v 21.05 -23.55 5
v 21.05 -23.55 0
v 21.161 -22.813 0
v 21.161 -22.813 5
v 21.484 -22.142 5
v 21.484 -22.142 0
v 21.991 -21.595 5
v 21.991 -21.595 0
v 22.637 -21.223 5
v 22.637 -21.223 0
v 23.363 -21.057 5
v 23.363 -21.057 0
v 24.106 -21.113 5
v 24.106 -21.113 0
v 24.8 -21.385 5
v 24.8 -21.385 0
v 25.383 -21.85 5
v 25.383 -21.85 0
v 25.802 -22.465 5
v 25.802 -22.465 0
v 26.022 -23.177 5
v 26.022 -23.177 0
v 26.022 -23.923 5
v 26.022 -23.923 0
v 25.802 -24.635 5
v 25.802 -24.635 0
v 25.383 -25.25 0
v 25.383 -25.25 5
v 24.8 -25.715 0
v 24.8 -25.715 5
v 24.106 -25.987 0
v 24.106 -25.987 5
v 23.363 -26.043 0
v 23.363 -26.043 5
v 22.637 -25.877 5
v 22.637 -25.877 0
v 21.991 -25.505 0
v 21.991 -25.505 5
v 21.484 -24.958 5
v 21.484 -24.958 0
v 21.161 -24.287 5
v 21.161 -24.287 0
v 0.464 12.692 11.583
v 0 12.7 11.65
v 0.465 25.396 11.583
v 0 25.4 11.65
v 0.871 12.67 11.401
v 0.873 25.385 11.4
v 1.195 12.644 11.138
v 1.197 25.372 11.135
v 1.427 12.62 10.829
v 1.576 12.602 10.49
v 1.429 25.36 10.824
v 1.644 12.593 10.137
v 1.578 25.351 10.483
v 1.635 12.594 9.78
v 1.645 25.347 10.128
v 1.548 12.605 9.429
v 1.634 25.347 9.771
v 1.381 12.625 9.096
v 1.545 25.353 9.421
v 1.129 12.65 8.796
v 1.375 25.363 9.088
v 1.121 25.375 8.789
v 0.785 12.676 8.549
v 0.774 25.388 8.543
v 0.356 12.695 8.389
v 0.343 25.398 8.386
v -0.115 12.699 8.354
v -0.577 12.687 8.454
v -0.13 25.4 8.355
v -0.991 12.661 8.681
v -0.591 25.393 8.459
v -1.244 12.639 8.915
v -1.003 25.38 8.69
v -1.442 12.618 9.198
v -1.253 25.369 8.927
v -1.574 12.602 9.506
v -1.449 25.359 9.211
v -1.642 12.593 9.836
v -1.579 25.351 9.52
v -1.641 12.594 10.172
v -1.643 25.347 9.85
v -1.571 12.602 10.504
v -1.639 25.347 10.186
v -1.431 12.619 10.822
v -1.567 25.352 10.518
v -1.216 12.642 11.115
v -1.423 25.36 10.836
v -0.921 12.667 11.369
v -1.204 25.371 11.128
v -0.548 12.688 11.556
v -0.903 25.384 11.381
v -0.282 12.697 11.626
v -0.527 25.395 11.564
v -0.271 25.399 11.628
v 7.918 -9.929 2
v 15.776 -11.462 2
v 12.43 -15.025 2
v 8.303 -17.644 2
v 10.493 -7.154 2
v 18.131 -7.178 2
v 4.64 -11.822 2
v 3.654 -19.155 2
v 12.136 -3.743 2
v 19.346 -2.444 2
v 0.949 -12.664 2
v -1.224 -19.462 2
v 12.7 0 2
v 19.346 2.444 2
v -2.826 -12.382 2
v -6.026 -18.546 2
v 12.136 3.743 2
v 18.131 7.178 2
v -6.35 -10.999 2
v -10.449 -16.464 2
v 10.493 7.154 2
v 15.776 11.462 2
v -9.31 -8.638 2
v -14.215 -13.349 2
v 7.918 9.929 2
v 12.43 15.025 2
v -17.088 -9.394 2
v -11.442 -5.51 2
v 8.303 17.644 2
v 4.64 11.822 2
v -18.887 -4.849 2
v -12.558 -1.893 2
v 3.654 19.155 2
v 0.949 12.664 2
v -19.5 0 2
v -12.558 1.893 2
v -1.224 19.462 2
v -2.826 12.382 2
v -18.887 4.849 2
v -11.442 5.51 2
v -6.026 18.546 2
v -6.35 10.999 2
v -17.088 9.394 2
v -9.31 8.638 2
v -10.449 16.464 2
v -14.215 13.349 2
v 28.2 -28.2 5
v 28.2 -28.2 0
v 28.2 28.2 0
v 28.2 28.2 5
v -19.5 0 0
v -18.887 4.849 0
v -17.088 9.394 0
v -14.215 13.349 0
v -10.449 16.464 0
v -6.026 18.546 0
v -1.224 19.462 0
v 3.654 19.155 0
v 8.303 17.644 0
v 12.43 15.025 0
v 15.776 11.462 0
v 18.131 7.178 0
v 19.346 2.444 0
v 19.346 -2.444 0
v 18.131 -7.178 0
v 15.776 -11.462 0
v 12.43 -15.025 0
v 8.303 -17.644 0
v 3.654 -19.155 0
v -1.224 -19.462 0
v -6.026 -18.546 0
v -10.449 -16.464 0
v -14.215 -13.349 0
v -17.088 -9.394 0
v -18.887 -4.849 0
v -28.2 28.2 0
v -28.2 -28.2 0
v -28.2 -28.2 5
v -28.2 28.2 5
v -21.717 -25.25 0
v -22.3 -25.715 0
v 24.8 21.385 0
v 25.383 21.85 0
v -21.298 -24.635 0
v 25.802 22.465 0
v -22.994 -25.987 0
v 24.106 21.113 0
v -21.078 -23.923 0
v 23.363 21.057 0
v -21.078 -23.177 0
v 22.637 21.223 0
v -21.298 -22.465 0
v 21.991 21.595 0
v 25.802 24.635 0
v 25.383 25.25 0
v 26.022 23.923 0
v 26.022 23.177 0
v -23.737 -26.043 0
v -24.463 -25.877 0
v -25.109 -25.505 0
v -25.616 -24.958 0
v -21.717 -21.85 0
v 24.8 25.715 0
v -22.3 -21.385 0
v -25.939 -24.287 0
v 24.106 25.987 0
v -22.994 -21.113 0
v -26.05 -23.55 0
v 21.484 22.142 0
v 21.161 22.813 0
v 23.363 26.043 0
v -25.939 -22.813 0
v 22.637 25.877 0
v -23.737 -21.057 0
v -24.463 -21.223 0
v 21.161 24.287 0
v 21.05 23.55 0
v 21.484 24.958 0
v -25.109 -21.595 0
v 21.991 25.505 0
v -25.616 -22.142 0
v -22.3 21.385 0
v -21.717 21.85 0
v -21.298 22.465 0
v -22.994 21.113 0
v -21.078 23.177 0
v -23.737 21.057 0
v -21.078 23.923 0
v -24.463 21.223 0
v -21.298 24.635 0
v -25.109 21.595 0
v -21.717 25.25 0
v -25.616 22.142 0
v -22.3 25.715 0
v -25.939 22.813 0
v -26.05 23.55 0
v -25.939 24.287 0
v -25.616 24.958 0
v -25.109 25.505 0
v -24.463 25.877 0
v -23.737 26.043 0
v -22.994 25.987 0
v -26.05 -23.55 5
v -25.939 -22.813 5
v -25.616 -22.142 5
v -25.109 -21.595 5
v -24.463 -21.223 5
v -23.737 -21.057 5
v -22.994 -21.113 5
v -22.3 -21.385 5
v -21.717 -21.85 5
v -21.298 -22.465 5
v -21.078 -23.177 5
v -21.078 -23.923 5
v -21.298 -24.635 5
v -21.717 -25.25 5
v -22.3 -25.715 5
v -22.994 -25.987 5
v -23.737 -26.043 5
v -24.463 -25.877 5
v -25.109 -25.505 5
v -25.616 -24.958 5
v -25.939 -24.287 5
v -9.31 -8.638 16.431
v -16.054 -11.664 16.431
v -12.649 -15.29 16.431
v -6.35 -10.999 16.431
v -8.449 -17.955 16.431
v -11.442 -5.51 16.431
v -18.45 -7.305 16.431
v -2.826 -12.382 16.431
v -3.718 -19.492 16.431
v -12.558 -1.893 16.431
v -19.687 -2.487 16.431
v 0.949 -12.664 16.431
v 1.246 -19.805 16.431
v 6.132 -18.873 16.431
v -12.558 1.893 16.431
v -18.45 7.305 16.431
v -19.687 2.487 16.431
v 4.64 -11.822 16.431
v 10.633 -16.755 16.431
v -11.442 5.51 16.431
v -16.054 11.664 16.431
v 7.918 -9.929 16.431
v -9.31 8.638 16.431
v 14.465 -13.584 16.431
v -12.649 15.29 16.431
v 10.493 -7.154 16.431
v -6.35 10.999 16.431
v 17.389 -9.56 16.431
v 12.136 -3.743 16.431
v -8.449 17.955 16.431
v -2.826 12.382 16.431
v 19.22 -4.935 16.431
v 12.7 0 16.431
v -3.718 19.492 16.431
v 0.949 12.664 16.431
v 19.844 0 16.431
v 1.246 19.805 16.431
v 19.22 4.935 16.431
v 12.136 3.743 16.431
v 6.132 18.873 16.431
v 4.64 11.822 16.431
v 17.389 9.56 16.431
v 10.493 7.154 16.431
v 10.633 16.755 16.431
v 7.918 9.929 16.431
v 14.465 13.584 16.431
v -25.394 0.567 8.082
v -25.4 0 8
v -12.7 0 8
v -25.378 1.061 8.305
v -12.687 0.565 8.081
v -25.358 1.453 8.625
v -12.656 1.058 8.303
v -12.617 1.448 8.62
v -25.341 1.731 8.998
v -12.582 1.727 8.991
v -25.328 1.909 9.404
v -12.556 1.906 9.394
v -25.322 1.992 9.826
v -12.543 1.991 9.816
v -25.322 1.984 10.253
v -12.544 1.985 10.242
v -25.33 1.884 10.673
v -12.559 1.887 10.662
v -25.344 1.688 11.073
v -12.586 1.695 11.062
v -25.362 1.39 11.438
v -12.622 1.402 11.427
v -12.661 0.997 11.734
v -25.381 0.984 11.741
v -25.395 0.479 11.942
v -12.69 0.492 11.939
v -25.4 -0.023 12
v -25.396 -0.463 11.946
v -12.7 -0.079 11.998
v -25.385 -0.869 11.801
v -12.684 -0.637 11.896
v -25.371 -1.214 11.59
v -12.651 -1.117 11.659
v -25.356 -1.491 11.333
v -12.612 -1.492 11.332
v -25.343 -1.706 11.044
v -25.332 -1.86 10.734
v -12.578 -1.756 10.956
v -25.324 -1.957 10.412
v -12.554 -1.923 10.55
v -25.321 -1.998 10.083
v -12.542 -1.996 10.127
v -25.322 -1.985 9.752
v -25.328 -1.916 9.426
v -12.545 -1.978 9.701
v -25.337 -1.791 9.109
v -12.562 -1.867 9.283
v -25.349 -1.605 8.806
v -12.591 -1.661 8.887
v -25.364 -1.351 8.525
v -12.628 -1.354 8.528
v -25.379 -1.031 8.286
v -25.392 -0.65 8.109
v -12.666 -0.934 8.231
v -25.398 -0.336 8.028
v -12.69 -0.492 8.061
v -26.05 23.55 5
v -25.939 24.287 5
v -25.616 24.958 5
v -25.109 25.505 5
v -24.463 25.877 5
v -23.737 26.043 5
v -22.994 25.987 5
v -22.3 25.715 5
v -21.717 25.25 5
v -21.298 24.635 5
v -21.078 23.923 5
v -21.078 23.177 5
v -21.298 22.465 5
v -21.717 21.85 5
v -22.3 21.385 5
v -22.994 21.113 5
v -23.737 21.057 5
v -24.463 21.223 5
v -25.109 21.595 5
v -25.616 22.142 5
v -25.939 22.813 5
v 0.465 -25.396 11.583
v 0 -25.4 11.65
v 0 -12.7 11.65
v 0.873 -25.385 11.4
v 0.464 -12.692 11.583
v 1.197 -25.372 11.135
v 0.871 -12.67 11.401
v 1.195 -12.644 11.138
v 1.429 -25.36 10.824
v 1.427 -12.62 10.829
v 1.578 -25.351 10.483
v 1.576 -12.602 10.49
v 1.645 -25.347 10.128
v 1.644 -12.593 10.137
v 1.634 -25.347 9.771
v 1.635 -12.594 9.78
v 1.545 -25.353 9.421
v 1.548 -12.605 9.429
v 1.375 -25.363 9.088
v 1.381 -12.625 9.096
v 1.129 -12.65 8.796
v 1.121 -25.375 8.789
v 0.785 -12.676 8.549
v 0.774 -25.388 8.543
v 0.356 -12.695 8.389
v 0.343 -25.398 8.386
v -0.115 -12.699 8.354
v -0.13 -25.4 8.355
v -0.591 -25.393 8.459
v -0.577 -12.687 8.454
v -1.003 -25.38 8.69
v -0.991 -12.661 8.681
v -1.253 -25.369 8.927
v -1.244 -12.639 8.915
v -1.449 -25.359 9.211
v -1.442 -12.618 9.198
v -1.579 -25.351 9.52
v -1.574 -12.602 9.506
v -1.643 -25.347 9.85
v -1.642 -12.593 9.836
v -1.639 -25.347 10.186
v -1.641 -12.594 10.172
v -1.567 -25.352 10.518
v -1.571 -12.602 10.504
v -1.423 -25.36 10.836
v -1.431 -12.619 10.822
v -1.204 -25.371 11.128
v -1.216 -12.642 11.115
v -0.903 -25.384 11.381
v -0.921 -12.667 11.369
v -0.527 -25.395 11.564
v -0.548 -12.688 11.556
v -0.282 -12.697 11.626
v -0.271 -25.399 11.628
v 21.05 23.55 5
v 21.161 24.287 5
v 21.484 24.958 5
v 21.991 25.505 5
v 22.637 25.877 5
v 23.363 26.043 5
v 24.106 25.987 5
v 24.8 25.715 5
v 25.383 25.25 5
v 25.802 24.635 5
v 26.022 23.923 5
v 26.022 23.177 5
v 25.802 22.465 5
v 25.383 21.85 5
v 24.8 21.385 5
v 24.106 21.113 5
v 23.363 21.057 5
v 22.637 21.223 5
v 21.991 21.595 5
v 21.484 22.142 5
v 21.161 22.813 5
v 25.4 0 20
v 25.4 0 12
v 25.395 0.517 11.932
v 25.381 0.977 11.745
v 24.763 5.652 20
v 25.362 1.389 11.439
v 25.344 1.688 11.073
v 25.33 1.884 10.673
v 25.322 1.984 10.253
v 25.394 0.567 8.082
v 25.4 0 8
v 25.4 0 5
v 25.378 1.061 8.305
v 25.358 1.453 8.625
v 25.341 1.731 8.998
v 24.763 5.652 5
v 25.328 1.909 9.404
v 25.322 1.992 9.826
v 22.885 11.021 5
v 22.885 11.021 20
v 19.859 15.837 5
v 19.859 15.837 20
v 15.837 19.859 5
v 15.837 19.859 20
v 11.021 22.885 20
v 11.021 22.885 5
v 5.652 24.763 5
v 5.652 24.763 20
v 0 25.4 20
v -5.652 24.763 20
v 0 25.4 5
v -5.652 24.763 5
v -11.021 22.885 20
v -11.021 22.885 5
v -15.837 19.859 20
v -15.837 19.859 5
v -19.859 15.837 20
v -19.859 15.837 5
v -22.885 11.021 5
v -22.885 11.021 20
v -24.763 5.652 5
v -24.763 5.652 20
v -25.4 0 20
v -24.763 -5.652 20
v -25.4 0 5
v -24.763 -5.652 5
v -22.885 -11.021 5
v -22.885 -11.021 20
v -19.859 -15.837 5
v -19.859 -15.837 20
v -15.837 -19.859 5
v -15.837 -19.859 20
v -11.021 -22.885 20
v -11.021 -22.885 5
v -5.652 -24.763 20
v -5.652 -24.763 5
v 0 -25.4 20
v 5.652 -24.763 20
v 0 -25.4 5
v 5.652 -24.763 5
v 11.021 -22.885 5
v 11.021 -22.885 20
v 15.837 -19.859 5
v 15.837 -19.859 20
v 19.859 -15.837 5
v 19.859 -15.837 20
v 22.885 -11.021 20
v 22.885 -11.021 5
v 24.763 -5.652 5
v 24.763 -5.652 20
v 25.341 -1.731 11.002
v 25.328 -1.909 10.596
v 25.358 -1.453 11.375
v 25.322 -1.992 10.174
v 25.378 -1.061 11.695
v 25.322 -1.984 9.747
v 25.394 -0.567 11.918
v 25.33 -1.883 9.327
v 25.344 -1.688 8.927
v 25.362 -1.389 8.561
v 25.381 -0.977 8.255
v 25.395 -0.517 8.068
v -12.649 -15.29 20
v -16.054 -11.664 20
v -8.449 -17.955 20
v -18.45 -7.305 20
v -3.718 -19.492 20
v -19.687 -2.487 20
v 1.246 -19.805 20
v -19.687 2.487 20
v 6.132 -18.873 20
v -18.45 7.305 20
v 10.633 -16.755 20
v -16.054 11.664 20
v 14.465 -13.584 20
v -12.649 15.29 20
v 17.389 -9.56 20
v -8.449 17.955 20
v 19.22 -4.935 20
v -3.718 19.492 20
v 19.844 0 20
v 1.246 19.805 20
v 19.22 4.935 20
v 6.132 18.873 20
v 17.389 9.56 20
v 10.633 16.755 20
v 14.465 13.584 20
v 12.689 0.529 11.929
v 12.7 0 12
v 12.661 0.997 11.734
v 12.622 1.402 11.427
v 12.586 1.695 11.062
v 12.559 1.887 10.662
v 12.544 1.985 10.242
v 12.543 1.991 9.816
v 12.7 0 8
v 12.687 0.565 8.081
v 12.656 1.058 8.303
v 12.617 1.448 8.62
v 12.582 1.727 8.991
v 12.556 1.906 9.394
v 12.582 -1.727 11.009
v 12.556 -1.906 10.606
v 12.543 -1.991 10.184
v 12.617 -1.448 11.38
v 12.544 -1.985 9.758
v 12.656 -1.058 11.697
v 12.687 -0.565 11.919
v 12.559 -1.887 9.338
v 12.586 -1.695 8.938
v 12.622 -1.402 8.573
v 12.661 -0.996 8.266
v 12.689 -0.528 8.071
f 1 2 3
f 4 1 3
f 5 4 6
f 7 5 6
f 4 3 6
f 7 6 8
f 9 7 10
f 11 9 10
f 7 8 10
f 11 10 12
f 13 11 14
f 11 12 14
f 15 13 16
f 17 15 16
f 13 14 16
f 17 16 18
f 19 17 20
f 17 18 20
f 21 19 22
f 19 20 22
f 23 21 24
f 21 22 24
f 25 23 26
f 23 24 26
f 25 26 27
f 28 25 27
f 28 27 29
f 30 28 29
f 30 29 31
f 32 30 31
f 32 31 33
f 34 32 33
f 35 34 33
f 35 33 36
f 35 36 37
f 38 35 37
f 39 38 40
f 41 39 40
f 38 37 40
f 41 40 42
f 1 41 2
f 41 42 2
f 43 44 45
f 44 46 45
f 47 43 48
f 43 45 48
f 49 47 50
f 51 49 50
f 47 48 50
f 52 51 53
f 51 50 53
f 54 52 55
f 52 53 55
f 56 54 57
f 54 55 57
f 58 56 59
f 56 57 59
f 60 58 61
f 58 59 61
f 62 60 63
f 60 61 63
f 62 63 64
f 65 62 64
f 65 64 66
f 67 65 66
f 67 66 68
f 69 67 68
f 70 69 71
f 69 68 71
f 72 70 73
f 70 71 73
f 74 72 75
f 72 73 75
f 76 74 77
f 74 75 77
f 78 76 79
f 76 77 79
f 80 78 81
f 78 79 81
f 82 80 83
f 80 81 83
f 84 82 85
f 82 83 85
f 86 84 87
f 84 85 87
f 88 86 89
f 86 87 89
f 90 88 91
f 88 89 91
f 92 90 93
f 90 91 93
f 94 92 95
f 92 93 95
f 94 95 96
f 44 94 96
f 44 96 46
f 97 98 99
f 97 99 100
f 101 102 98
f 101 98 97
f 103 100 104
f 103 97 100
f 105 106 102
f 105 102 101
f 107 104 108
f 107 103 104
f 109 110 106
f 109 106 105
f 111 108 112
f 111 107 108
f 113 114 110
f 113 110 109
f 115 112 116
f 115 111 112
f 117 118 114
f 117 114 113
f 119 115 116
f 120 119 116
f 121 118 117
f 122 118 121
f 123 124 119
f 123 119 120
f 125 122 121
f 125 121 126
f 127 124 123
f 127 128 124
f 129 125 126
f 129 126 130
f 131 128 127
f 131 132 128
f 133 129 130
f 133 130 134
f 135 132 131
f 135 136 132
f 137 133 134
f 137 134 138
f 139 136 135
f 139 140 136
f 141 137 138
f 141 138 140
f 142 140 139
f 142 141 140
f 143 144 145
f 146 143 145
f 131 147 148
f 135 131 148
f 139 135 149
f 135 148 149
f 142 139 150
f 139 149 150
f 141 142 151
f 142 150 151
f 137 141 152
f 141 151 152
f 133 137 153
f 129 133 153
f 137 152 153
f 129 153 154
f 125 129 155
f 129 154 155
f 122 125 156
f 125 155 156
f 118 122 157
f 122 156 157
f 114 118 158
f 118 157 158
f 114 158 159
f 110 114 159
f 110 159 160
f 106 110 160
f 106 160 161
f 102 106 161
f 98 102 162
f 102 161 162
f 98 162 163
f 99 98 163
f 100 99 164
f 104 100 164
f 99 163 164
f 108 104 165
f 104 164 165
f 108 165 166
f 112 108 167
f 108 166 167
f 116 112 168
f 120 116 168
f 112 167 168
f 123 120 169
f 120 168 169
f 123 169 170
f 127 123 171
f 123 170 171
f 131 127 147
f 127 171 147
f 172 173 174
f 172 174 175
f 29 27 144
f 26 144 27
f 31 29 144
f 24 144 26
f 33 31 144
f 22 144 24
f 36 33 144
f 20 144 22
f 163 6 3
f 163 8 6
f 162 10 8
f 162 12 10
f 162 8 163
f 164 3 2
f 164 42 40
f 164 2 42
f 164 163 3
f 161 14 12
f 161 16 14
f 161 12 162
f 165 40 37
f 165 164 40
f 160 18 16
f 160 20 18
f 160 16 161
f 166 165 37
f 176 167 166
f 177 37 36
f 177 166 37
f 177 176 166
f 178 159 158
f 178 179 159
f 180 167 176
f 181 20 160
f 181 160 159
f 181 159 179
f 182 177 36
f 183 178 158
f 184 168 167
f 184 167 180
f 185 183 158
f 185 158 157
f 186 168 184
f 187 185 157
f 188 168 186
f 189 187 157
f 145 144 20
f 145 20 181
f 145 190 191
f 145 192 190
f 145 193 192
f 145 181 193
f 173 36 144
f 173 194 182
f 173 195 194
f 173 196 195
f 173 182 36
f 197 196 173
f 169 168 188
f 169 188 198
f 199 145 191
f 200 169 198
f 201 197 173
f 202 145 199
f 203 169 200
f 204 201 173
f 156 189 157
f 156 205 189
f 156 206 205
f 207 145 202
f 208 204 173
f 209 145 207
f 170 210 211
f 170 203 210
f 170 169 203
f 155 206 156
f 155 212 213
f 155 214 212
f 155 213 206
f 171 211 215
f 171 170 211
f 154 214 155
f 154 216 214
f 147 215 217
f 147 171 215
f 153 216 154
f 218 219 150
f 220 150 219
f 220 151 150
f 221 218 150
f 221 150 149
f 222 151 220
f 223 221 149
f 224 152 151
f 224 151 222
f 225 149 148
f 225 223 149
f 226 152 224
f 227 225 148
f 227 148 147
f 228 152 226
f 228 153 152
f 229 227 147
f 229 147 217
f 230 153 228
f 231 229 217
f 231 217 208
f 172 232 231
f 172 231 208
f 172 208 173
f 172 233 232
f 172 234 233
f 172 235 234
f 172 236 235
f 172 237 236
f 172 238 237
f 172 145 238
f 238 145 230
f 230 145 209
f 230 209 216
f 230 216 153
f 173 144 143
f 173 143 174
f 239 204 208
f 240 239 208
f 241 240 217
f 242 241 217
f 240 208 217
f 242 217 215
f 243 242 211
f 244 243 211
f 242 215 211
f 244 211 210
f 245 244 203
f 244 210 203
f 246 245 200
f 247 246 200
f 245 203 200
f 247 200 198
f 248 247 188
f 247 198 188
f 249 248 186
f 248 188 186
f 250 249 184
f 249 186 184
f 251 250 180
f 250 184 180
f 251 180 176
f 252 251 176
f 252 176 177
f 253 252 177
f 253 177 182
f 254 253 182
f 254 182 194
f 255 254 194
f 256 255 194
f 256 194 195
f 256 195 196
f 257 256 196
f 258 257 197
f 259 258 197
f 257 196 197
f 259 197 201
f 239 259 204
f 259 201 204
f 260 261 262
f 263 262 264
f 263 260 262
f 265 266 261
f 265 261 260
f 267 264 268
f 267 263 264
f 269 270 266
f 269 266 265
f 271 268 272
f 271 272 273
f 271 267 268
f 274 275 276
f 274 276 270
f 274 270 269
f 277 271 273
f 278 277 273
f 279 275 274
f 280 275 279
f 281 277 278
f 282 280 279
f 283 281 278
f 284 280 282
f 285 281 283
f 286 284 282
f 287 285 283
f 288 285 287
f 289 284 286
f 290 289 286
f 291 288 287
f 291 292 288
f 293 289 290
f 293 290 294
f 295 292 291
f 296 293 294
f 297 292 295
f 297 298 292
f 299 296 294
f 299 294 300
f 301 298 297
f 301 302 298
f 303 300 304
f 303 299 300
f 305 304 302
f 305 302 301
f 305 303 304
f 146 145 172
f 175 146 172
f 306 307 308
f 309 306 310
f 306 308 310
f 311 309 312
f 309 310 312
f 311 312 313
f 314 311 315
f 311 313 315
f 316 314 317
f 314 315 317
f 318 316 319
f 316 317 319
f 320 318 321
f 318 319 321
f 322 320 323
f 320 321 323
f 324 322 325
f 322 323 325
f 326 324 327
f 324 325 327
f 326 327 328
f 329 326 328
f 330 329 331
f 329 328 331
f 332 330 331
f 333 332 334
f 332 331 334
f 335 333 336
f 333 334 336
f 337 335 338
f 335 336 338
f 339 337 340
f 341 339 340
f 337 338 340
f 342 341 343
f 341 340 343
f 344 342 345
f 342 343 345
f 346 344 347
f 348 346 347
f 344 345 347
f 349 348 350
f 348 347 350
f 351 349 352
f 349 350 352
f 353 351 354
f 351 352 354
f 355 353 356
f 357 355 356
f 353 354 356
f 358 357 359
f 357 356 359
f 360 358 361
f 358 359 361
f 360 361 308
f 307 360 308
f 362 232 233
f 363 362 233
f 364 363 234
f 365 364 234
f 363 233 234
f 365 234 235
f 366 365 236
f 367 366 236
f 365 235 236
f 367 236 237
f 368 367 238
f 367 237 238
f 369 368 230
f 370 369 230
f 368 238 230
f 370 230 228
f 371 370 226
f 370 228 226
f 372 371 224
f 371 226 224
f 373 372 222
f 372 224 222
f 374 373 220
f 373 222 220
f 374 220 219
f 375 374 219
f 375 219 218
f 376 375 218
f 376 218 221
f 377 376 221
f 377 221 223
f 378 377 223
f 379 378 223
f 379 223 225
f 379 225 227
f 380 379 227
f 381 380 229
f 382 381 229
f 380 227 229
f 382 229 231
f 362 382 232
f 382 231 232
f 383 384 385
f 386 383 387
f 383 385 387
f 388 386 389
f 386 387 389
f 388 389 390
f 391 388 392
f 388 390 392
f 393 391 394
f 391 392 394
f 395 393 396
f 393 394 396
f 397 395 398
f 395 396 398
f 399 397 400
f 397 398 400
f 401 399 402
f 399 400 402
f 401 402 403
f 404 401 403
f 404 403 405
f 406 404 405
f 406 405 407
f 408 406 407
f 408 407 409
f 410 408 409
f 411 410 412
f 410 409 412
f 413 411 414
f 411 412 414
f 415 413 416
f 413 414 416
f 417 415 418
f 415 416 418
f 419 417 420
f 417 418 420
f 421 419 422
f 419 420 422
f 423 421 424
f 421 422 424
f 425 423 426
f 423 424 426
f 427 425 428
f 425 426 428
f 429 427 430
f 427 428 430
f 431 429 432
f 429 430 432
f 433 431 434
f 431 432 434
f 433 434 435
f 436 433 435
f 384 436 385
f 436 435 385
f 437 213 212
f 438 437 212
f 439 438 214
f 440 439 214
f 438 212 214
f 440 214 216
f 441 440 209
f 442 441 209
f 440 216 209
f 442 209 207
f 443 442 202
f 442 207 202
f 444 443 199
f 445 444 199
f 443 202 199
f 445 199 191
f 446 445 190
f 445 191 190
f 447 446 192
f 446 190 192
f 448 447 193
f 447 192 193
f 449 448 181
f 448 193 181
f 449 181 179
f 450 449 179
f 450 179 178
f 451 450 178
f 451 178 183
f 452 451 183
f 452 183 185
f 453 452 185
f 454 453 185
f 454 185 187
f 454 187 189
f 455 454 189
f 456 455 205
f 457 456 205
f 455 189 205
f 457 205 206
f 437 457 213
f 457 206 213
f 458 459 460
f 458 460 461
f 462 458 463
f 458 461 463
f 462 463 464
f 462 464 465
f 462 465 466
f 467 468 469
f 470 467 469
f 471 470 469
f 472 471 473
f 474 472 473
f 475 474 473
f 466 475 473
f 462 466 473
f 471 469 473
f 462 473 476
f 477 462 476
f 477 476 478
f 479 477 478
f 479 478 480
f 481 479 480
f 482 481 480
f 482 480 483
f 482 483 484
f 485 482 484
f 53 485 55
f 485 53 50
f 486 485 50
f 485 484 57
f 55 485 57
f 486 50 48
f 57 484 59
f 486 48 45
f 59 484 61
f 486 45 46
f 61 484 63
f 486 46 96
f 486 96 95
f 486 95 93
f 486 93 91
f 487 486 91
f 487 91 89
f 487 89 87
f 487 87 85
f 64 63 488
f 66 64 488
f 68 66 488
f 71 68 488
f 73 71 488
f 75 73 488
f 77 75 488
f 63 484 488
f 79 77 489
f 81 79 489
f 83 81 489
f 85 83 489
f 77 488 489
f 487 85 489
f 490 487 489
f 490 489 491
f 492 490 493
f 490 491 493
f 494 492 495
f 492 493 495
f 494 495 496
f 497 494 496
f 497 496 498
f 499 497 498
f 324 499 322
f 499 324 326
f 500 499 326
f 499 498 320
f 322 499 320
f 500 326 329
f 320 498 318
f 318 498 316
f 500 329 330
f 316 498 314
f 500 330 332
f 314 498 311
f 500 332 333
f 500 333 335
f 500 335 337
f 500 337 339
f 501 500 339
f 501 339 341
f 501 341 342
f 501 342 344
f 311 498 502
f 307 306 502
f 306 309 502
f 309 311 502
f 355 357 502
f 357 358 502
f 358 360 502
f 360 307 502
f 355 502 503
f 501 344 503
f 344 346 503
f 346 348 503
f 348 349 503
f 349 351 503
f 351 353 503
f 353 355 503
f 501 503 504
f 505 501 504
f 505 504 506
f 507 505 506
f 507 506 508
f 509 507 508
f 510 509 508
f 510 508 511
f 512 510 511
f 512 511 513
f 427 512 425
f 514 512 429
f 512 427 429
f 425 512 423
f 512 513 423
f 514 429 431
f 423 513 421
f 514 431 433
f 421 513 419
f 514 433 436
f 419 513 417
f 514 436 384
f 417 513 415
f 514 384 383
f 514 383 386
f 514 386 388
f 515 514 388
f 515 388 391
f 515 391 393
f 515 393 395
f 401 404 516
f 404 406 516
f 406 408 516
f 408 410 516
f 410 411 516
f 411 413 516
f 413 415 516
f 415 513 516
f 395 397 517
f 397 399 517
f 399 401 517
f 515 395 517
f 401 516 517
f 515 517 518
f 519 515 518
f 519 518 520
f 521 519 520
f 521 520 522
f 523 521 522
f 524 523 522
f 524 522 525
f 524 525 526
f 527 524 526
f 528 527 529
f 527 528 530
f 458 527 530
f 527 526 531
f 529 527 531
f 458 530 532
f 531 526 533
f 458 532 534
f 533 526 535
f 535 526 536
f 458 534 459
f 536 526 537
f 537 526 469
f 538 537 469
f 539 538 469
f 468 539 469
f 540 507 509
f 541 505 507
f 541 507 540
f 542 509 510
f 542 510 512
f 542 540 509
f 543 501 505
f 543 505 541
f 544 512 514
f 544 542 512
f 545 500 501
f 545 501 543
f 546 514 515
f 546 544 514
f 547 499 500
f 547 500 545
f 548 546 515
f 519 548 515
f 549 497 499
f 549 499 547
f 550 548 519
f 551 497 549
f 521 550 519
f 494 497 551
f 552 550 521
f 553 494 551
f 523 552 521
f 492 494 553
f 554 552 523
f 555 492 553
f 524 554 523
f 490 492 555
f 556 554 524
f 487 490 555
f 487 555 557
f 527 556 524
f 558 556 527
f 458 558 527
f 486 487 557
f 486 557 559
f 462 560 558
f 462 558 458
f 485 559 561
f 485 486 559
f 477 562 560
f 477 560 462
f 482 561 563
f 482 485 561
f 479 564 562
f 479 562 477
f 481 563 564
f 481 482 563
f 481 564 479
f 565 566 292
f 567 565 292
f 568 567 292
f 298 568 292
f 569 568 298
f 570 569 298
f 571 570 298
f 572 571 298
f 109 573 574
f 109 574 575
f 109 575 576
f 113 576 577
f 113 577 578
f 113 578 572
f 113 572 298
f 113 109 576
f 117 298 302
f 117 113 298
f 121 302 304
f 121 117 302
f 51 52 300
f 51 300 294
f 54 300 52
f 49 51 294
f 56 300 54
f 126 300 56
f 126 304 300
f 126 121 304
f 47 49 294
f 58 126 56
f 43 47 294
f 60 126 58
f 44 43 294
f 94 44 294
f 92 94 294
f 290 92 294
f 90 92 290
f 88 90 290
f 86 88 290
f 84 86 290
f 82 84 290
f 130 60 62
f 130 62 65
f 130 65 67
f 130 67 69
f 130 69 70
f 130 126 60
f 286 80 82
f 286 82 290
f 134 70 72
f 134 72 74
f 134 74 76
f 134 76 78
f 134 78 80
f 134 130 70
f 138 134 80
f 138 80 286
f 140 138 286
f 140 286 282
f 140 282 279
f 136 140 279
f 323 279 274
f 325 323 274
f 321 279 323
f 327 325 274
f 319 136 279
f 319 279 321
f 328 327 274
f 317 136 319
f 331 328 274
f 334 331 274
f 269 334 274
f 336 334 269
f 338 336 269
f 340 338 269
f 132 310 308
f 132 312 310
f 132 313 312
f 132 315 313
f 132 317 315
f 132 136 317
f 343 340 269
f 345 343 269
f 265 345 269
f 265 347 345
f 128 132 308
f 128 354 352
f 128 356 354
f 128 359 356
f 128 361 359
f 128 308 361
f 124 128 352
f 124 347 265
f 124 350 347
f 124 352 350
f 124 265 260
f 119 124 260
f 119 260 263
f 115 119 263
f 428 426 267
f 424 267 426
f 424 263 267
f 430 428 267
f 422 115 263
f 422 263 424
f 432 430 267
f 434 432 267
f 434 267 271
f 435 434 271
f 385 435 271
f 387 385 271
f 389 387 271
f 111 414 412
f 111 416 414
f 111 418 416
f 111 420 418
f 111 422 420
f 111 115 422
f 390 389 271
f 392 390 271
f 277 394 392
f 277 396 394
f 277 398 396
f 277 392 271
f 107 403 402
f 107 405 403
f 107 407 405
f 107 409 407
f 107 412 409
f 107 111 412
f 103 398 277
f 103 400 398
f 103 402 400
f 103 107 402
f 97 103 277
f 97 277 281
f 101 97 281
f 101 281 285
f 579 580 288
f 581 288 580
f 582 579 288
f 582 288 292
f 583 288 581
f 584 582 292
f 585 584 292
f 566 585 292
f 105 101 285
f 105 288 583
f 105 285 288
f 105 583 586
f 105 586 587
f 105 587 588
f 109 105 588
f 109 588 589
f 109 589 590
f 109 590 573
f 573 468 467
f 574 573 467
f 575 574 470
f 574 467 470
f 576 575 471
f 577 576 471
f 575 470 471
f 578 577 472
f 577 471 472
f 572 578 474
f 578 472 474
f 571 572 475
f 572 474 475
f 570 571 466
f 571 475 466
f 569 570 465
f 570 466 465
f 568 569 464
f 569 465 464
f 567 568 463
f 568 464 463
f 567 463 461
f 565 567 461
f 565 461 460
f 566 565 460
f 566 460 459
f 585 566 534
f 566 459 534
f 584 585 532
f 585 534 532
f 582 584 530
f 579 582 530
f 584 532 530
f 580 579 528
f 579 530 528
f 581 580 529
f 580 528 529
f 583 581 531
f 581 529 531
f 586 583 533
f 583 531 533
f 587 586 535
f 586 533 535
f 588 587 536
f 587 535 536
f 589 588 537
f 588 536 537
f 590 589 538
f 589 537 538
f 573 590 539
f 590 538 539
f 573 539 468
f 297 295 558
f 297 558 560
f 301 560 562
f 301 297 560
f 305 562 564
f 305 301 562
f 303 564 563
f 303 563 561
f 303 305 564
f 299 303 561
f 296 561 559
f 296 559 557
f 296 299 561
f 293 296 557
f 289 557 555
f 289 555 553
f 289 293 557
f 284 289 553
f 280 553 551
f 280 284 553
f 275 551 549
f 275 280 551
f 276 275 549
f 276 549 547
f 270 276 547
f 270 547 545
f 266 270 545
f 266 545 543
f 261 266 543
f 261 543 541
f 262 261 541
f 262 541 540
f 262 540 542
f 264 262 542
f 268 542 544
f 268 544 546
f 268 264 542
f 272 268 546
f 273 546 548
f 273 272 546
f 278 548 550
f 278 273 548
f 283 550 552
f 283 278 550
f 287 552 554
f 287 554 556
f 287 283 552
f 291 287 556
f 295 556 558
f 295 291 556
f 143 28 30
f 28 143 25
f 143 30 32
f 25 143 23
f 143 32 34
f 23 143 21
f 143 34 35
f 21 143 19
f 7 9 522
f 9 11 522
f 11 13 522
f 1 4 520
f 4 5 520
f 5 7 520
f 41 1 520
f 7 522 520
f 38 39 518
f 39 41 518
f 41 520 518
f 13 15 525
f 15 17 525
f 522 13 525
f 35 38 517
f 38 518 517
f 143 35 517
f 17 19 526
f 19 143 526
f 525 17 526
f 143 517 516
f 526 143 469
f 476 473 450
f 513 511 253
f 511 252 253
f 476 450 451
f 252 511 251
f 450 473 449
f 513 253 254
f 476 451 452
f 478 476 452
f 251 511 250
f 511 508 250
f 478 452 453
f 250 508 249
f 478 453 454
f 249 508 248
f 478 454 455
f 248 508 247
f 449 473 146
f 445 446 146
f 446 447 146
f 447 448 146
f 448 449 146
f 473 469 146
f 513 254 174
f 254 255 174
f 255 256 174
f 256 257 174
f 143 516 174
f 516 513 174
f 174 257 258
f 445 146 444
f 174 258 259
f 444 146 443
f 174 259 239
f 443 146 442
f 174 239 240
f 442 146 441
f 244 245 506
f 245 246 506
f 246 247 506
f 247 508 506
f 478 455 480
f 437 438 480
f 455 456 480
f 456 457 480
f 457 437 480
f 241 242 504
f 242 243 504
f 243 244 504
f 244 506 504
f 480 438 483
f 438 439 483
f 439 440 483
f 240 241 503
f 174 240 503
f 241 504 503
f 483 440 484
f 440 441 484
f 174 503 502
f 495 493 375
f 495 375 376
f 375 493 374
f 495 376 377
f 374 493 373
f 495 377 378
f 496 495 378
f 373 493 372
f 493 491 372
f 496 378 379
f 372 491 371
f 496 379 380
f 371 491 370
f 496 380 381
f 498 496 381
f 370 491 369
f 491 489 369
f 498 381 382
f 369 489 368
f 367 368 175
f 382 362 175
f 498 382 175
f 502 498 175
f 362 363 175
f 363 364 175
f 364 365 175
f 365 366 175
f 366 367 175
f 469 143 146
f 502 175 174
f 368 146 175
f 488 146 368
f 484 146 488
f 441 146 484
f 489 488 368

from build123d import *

# Parameters (mm, degrees)
SKETCH1_R           = 25.4
SKETCH1_R_2         = 12.7
BOSS_EXTRUDE1_DEPTH = 20
SKETCH2_R           = 2
CUT_EXTRUDE1_DEPTH  = 30
CUT_EXTRUDE2_START  = -3.5687
SKETCH3_R           = 19.84375
SKETCH3_R_2         = 12.7
CUT_EXTRUDE2_DEPTH  = 3.5687
SKETCH5_R           = 1.65
CUT_EXTRUDE4_DEPTH  = 31.7
SKETCH6_W           = 56.4
SKETCH6_H           = 56.4
SKETCH6_R           = 12.7
SKETCH6_R_2         = 2.5
BOSS_EXTRUDE2_DEPTH = 5
SKETCH7_R           = 19.5
CUT_EXTRUDE5_DEPTH  = 2


with BuildPart() as part:
    # Sketch1 → Boss-Extrude1 (new body)
    with BuildSketch(Plane.XY):
        Circle(SKETCH1_R)
        Circle(SKETCH1_R_2, mode=Mode.SUBTRACT)
    extrude(amount=BOSS_EXTRUDE1_DEPTH)

    # Sketch2 → Cut-Extrude1 (cut, symmetric)
    with BuildSketch(Plane(origin=(0, 0, 0), x_dir=(0, 0, -1), z_dir=(1, 0, 0))):
        with Locations((-10, 0)):
            Circle(SKETCH2_R)
    extrude(amount=CUT_EXTRUDE1_DEPTH, both=True, mode=Mode.SUBTRACT)

    # Sketch3 → Cut-Extrude2 (cut)
    with BuildSketch(Plane.XY.offset(20).offset(CUT_EXTRUDE2_START)):
        Circle(SKETCH3_R)
        Circle(SKETCH3_R_2, mode=Mode.SUBTRACT)
    extrude(amount=CUT_EXTRUDE2_DEPTH, mode=Mode.SUBTRACT)

    # Sketch5 → Cut-Extrude4 (cut, symmetric)
    with BuildSketch(Plane(origin=(0, 0, 0), x_dir=(1, 0, 0), z_dir=(0, 1, 0))):
        with Locations(Location((0, -10, 0), (0, 0, 270))):
            Circle(SKETCH5_R)
    extrude(amount=CUT_EXTRUDE4_DEPTH, both=True, mode=Mode.SUBTRACT)

    # Sketch6 → Boss-Extrude2 (add)
    with BuildSketch(Plane(origin=(0, 0, 0), x_dir=(-1, 0, 0), z_dir=(0, 0, -1))):
        Rectangle(SKETCH6_W, SKETCH6_H)
        with Locations(Location((0, 0, 0), (0, 0, 180))):
            Circle(SKETCH6_R, mode=Mode.SUBTRACT)
        with Locations((-23.55, 23.55)):
            Circle(SKETCH6_R_2, mode=Mode.SUBTRACT)
        with Locations((23.55, 23.55)):
            Circle(SKETCH6_R_2, mode=Mode.SUBTRACT)
        with Locations((23.55, -23.55)):
            Circle(SKETCH6_R_2, mode=Mode.SUBTRACT)
        with Locations((-23.55, -23.55)):
            Circle(SKETCH6_R_2, mode=Mode.SUBTRACT)
    extrude(amount=-BOSS_EXTRUDE2_DEPTH)

    # Sketch7 → Cut-Extrude5 (cut)
    with BuildSketch(Plane(origin=(0, 0, 0), x_dir=(-1, 0, 0), z_dir=(0, 0, -1))):
        Circle(SKETCH7_R)
    extrude(amount=-CUT_EXTRUDE5_DEPTH, mode=Mode.SUBTRACT)


solid = part.part
